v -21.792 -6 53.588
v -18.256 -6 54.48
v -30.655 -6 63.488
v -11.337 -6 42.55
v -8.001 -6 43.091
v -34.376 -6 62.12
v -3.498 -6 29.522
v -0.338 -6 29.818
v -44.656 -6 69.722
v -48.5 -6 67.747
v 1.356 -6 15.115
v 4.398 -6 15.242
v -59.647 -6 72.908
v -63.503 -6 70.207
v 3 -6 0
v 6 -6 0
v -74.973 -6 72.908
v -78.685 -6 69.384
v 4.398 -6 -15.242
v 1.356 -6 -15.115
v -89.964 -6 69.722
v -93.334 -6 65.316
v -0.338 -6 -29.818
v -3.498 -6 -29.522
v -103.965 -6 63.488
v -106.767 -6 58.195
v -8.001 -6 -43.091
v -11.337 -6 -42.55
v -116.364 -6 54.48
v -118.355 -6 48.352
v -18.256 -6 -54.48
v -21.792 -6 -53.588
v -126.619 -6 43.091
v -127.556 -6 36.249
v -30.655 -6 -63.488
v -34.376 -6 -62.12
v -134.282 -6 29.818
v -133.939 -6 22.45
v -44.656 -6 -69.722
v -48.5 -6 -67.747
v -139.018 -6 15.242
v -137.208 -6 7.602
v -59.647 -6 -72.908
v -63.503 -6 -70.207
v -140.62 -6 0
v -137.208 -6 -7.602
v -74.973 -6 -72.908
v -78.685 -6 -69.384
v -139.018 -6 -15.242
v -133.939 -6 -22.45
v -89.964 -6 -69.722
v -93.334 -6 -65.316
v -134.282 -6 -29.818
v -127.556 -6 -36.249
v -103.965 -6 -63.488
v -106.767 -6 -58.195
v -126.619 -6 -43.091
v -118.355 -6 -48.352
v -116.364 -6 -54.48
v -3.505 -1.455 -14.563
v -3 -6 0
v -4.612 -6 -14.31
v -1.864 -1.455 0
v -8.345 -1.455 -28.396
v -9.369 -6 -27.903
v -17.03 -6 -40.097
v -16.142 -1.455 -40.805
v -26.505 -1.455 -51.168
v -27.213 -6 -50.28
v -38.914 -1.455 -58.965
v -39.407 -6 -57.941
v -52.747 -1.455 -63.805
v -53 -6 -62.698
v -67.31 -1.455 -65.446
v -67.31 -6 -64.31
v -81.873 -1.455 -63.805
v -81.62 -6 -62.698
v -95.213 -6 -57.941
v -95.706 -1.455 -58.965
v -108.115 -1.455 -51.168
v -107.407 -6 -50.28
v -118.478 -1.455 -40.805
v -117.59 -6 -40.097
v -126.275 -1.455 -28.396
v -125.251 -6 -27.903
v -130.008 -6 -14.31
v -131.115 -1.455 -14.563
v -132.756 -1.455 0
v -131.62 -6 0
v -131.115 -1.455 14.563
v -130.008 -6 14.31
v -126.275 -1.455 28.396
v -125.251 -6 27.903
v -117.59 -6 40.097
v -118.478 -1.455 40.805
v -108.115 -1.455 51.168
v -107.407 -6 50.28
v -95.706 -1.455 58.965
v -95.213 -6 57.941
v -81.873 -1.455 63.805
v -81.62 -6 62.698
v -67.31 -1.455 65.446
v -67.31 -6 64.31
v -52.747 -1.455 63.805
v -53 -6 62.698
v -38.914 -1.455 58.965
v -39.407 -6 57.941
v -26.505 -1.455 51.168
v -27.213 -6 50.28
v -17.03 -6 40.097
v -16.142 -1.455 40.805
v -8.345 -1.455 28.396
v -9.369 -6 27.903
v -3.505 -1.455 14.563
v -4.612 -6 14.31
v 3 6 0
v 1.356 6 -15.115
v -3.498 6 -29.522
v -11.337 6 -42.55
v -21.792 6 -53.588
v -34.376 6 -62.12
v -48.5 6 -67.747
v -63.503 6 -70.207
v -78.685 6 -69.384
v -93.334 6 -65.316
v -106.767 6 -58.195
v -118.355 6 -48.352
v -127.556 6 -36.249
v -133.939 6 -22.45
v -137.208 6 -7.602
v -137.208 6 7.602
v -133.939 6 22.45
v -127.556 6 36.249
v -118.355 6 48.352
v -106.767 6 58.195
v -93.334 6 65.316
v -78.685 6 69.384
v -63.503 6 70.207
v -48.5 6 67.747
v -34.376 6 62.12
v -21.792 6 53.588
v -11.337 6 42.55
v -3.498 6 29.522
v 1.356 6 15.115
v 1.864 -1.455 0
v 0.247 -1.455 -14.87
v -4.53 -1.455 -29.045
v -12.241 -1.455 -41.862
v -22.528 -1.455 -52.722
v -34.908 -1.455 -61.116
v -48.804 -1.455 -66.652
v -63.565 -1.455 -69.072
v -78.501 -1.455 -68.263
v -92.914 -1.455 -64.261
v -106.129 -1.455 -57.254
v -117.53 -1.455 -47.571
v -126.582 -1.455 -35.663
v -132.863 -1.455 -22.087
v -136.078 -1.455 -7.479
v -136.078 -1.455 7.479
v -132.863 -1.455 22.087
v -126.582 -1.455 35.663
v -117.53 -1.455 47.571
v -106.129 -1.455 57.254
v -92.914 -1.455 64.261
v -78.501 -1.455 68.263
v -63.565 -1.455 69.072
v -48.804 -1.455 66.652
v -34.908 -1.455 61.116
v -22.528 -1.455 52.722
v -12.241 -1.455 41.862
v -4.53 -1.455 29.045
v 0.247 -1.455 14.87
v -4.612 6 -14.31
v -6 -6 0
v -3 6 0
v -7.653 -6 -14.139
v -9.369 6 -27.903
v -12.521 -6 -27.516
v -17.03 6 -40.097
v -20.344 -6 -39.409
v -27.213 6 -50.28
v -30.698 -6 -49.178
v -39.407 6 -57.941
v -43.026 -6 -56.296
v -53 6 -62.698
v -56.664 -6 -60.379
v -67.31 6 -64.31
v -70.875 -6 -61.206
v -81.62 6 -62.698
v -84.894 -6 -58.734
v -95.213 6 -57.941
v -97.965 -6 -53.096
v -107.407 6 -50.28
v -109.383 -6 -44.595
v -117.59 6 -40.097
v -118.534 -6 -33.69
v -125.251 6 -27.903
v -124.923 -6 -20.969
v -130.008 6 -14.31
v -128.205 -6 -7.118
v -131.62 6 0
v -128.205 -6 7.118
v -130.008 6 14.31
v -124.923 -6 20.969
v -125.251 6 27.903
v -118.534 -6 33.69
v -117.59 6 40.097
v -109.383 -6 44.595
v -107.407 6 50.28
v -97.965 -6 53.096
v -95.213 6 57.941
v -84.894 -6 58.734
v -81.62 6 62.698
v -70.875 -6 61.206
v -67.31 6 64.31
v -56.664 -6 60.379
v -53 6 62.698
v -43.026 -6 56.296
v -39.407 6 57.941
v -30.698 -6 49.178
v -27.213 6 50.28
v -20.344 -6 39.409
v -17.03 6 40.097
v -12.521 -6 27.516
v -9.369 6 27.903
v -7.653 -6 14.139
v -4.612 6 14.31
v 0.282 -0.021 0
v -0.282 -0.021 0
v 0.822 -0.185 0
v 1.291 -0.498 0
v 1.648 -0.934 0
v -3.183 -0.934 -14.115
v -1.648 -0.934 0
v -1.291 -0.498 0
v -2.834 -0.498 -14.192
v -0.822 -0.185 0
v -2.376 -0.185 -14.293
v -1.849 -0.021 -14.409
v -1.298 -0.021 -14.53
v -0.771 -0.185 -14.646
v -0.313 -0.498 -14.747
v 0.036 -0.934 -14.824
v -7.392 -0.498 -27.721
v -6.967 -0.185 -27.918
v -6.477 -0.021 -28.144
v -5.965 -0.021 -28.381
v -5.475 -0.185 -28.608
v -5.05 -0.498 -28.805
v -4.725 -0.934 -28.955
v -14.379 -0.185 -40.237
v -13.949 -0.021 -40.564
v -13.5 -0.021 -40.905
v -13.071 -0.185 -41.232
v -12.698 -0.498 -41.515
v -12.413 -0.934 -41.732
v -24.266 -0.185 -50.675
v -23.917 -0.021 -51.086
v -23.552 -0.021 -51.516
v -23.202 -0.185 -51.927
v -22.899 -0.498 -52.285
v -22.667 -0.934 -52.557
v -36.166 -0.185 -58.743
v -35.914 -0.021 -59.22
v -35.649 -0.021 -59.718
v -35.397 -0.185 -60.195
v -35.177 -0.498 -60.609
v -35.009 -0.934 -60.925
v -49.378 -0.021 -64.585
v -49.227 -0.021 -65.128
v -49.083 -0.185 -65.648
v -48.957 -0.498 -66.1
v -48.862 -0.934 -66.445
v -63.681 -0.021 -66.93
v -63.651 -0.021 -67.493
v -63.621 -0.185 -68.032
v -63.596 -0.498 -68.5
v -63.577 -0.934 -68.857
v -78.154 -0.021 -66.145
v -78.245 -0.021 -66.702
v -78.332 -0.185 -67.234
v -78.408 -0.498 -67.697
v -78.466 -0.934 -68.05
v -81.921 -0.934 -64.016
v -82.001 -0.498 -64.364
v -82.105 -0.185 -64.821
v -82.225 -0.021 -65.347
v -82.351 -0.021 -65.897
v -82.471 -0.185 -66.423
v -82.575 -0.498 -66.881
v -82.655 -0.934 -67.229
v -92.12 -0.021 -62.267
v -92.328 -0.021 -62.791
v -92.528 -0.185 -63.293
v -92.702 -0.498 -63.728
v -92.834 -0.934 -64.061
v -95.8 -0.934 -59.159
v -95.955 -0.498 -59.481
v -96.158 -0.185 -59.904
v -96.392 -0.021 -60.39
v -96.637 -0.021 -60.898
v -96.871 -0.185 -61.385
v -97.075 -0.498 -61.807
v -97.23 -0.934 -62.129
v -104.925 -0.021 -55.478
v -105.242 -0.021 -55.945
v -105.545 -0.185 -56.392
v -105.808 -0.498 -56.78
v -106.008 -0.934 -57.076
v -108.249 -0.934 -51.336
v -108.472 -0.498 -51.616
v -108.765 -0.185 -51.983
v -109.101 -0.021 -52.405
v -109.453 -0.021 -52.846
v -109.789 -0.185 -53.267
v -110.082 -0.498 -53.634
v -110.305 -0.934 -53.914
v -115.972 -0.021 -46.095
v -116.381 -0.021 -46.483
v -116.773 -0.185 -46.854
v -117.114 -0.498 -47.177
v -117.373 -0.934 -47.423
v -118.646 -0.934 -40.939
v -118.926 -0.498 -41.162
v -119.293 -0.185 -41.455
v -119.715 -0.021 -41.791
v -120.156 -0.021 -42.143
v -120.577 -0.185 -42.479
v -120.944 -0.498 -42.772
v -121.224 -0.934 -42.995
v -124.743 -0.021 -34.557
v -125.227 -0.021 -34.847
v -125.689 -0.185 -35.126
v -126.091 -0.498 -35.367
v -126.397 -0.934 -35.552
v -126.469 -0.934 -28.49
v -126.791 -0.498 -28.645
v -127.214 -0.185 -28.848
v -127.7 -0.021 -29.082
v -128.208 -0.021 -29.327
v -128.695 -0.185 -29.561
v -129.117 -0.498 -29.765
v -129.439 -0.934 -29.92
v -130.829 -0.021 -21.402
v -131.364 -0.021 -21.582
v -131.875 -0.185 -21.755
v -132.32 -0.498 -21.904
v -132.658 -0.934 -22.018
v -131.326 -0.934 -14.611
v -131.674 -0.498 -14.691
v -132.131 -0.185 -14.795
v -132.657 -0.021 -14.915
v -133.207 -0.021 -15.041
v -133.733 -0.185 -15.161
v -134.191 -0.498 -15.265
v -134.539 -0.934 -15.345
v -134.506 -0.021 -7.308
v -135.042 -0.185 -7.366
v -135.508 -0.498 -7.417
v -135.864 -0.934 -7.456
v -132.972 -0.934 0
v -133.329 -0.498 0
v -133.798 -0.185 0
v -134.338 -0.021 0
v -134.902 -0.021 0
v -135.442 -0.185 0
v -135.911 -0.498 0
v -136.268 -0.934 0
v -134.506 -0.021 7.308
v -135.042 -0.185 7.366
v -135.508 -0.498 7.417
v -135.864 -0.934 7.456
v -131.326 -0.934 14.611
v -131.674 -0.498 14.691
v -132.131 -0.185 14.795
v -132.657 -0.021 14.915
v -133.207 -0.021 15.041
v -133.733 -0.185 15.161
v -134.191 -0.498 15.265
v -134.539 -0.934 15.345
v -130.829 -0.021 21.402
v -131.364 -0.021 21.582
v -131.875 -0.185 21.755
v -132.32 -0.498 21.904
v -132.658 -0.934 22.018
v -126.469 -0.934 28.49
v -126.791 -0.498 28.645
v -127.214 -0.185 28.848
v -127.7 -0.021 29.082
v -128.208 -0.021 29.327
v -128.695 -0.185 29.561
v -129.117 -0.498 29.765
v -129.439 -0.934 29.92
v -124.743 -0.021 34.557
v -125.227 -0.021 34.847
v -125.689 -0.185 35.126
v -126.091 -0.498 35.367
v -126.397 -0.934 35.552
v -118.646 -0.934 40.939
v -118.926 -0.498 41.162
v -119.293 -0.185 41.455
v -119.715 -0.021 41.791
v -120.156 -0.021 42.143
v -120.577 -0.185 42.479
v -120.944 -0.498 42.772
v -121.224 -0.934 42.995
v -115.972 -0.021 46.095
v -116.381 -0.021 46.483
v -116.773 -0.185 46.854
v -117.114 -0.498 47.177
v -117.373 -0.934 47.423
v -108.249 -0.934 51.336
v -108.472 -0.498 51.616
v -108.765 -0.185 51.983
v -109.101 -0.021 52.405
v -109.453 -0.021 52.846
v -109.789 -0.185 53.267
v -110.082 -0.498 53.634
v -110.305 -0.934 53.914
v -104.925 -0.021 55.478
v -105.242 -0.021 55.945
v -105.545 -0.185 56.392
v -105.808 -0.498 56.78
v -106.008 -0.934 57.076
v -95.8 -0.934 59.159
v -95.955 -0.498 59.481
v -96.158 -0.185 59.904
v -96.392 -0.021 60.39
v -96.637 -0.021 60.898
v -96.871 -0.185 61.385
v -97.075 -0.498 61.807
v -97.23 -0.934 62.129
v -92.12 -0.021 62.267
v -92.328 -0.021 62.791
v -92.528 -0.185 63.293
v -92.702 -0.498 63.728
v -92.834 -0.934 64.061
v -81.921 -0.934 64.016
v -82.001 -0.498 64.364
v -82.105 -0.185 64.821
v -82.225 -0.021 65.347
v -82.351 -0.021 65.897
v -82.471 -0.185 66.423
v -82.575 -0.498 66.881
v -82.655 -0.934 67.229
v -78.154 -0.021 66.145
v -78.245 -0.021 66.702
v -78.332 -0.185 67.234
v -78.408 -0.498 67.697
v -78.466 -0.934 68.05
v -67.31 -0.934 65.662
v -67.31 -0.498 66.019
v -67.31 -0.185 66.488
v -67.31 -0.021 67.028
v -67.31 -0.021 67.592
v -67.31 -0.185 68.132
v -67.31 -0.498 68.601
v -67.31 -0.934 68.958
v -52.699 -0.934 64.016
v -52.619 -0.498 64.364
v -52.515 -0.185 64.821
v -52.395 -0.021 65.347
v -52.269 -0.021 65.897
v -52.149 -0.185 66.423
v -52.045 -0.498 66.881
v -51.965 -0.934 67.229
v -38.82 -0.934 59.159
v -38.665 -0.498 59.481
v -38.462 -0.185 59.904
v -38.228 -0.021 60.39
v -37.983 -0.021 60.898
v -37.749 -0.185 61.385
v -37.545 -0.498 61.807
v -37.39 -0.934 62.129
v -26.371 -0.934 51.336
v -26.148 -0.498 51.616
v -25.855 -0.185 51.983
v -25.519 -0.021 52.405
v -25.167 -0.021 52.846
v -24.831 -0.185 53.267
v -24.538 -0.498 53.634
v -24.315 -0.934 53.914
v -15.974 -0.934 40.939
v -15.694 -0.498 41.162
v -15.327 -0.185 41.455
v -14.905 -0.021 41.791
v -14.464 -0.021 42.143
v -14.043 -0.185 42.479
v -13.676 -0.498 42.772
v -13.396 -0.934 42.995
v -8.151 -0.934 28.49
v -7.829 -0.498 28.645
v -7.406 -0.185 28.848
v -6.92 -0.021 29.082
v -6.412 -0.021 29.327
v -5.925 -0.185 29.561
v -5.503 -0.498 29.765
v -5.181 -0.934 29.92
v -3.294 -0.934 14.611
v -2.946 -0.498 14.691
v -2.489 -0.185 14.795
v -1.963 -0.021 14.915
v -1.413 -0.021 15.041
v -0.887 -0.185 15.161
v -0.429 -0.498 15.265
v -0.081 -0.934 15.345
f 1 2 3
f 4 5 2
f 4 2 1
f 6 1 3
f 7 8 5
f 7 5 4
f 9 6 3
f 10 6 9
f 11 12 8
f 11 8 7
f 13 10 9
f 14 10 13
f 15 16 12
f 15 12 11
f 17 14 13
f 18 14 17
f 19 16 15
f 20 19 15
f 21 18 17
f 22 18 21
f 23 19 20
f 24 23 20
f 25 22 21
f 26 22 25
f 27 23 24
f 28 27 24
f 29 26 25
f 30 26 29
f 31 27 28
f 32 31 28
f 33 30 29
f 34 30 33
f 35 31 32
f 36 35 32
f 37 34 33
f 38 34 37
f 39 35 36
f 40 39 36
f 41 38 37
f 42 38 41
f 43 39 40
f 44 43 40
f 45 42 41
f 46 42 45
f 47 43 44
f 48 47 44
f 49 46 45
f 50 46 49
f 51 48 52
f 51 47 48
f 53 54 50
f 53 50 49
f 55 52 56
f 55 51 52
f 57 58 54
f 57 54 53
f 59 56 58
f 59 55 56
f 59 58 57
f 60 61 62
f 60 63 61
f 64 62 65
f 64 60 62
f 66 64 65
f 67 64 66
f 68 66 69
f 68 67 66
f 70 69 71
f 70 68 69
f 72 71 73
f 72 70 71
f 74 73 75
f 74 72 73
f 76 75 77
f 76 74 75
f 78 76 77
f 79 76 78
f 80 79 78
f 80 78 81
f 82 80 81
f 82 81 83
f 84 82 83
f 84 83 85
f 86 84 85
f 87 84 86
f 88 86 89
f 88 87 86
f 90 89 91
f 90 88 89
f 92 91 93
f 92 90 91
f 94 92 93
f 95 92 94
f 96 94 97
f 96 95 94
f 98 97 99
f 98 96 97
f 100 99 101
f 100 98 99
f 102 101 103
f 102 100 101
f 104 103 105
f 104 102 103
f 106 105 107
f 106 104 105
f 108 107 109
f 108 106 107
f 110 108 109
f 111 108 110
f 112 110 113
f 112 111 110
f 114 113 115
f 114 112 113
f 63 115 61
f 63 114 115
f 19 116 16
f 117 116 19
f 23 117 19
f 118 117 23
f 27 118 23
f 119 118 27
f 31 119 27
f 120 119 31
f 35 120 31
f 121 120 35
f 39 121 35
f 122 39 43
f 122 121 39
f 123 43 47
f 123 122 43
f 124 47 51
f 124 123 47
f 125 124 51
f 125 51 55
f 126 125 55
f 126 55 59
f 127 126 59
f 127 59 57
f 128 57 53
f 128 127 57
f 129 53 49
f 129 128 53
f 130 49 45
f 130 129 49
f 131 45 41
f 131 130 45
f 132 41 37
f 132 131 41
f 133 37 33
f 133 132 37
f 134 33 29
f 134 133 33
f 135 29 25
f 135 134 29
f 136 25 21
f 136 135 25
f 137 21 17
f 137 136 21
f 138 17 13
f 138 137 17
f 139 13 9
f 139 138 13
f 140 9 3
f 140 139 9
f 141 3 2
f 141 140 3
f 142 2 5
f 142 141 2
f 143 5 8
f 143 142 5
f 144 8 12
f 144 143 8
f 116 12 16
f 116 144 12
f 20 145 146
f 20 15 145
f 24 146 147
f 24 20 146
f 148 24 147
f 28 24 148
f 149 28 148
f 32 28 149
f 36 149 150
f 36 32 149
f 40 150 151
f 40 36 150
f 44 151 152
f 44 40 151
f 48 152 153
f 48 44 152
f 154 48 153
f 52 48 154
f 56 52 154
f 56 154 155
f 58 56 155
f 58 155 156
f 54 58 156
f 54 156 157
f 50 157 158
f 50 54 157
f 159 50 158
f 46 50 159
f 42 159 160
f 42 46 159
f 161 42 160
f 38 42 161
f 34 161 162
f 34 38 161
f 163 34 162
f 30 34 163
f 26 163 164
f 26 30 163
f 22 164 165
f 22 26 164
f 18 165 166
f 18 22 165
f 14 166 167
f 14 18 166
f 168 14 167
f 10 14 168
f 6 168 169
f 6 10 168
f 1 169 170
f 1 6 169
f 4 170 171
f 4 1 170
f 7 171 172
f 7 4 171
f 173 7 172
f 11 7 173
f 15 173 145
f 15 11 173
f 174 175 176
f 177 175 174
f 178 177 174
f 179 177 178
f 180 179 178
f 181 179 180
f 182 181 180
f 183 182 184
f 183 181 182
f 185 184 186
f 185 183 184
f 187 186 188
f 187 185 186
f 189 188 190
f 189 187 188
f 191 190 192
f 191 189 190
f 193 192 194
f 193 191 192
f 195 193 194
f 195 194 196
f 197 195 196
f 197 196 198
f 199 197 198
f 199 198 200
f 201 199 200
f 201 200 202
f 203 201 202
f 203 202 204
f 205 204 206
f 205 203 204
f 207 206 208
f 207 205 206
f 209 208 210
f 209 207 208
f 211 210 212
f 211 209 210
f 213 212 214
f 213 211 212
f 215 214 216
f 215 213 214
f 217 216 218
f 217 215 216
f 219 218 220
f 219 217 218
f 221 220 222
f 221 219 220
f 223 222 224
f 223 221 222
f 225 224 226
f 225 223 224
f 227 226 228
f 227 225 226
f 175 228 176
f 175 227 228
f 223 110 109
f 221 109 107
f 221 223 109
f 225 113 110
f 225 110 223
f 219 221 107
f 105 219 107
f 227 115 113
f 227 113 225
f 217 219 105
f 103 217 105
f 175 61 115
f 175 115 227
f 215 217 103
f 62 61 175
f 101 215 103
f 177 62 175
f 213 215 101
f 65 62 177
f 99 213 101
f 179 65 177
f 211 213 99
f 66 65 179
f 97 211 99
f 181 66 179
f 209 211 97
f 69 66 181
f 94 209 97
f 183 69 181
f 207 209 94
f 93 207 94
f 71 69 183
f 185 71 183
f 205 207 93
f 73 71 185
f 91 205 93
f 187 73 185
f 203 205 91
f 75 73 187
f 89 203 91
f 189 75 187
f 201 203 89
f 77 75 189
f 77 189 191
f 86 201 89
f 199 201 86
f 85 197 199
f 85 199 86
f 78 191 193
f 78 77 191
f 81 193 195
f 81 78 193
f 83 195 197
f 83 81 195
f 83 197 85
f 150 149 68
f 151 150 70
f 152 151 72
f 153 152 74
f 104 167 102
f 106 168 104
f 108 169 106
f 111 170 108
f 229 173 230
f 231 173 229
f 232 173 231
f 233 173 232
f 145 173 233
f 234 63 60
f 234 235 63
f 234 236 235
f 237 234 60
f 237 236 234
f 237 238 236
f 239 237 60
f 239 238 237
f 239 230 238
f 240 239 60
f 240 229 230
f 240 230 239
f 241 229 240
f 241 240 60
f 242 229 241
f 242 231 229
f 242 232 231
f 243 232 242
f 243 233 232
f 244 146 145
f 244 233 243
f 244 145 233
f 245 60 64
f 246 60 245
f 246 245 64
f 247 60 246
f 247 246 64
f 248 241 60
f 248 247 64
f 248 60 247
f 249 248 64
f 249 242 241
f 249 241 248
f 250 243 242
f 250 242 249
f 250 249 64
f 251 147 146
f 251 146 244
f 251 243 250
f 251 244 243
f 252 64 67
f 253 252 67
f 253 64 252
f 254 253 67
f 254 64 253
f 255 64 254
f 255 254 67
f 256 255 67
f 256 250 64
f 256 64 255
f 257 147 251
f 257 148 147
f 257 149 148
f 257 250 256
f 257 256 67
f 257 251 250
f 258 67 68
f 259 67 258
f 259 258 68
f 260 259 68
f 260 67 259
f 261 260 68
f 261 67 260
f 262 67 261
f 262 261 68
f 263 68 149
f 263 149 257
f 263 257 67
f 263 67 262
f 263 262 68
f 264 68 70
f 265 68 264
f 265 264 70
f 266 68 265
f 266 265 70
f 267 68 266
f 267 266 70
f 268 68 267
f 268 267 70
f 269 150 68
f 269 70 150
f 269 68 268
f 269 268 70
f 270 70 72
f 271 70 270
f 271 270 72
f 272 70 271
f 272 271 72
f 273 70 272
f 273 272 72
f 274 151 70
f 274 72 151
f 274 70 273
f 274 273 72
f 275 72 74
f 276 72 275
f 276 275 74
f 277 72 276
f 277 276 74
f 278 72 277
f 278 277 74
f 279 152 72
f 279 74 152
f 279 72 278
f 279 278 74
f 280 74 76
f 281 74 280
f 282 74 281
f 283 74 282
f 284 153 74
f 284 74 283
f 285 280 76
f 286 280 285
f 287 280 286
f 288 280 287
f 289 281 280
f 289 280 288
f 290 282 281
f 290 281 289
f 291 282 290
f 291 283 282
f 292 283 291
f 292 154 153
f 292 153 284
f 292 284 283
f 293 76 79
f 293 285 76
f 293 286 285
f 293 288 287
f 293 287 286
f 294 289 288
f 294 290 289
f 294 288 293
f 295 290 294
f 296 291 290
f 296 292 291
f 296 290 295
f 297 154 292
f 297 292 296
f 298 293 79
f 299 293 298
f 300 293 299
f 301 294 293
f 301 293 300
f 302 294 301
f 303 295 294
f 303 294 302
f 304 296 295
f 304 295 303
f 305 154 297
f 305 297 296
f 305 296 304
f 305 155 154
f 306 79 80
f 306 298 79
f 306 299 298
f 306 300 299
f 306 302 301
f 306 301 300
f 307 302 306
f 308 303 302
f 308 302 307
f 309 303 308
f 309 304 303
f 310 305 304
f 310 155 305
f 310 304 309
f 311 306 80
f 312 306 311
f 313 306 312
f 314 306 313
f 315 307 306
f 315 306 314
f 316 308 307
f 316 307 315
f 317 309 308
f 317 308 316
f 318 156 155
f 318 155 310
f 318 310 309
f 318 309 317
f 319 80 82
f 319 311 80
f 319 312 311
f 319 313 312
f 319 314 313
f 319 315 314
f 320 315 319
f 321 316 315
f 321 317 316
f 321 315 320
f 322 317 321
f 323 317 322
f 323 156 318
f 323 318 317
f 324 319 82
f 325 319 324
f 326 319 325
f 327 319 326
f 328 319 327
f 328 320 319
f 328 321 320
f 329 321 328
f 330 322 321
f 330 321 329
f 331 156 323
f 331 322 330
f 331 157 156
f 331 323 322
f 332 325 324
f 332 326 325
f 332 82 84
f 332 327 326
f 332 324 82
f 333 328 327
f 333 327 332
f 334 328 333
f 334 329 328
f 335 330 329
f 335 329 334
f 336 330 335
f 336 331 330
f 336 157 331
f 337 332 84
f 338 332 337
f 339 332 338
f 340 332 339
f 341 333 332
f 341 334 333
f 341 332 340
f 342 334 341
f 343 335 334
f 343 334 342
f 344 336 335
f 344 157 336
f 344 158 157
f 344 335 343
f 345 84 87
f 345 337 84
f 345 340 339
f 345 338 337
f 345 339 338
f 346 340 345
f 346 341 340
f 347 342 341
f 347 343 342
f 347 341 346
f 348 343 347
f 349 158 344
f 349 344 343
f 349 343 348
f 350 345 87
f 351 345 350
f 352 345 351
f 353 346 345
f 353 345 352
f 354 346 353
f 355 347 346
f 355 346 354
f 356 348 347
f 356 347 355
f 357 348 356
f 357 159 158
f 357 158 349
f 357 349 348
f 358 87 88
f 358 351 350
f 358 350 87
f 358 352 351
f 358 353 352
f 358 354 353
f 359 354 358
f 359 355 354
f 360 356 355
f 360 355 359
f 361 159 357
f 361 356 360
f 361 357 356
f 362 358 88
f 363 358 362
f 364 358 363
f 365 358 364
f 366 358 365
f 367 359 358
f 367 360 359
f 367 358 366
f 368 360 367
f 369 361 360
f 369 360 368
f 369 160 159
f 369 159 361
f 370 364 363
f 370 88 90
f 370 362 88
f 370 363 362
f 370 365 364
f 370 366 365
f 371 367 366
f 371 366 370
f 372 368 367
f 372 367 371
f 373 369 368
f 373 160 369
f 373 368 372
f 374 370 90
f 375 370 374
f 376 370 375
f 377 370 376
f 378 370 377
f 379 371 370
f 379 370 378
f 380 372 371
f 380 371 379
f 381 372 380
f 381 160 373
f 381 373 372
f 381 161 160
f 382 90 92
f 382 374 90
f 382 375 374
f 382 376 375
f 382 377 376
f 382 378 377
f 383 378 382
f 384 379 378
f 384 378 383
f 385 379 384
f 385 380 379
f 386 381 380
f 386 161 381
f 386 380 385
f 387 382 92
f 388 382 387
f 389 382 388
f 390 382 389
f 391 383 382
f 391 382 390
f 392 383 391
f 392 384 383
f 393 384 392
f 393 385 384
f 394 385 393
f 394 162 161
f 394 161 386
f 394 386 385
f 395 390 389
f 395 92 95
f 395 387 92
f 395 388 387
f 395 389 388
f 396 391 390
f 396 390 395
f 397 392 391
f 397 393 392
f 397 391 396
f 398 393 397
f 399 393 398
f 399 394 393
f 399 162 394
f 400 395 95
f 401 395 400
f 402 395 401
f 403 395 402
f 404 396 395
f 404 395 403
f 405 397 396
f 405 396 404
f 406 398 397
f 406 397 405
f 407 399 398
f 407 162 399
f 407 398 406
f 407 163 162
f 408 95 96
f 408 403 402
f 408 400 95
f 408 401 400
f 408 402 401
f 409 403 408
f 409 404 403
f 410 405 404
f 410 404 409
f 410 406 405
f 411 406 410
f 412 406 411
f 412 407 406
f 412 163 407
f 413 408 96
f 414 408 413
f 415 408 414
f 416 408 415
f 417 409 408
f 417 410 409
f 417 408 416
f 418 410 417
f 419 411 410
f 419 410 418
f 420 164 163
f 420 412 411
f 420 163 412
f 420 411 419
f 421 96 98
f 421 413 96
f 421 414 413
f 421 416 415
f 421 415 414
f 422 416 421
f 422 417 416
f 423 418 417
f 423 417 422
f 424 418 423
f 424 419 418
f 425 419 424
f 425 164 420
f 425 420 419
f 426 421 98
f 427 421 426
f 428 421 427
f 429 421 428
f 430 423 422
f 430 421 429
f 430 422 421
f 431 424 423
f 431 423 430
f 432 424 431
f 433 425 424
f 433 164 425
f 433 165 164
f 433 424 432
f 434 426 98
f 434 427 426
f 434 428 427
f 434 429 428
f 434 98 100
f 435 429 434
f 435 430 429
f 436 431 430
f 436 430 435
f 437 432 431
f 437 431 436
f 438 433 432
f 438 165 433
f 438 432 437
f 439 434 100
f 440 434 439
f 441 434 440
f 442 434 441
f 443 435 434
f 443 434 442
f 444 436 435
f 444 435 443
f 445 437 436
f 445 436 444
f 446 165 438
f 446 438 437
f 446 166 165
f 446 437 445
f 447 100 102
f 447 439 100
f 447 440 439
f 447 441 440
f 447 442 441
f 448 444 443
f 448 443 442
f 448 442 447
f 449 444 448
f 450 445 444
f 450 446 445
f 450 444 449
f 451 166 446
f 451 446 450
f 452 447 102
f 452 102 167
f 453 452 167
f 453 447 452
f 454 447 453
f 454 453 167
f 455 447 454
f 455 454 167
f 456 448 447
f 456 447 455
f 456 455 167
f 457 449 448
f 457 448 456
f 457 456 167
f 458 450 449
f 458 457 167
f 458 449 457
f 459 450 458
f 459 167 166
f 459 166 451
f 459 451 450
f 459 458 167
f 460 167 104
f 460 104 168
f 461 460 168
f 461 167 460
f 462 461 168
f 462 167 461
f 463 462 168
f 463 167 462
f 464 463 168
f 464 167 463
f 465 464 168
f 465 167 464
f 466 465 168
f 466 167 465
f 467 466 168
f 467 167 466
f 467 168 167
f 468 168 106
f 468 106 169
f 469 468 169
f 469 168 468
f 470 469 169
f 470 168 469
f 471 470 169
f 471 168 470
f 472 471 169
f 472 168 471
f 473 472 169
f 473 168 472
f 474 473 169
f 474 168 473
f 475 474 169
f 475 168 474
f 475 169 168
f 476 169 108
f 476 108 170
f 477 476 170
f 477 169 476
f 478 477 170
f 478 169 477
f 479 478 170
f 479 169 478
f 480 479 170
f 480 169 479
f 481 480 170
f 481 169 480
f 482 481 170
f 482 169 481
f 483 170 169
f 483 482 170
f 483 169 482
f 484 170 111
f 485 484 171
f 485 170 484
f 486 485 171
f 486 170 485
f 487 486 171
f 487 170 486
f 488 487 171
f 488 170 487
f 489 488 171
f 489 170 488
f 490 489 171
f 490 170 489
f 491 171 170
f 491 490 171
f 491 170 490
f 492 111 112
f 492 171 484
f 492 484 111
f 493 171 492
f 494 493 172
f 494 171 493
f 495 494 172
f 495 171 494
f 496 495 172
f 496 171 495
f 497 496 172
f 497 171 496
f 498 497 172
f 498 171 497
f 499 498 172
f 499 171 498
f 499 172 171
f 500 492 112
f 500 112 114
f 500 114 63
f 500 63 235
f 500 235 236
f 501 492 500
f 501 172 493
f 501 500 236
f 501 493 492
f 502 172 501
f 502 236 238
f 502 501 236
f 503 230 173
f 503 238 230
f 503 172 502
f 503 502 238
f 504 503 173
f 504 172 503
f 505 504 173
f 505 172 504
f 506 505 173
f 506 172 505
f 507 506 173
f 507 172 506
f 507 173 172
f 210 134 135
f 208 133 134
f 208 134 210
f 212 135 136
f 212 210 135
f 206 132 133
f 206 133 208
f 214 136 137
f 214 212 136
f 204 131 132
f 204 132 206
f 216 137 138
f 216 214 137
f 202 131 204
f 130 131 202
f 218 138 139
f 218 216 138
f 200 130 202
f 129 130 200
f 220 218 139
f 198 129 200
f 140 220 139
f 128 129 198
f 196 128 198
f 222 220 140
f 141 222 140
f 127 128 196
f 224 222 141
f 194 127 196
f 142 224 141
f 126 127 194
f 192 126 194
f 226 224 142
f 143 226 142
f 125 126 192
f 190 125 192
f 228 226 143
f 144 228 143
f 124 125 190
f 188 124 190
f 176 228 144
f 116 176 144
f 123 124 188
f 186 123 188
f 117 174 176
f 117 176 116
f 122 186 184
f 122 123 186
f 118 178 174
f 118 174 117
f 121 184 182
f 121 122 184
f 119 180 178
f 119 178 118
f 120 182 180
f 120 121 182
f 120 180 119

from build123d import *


with BuildPart() as part:
    # Sketch1 → Revolve1 (revolve)
    with BuildSketch(Plane.XY):
        with BuildLine():
            Line((3, 6), (-3, 6))
            Line((-3, 6), (-6, -6))
            Line((-6, -6), (-3, -6))
            Line((-3, -6), (-1.863803438, -1.45521375))
            ThreePointArc((-1.863803438, -1.45521375), (0, 0), (1.863803438, -1.45521375))
            Line((1.863803438, -1.45521375), (3, -6))
            Line((3, -6), (6, -6))
            Line((6, -6), (3, 6))
        make_face()
    revolve(axis=Axis((-67.31, 0, 0), (0, 1, 0)))


solid = part.part
